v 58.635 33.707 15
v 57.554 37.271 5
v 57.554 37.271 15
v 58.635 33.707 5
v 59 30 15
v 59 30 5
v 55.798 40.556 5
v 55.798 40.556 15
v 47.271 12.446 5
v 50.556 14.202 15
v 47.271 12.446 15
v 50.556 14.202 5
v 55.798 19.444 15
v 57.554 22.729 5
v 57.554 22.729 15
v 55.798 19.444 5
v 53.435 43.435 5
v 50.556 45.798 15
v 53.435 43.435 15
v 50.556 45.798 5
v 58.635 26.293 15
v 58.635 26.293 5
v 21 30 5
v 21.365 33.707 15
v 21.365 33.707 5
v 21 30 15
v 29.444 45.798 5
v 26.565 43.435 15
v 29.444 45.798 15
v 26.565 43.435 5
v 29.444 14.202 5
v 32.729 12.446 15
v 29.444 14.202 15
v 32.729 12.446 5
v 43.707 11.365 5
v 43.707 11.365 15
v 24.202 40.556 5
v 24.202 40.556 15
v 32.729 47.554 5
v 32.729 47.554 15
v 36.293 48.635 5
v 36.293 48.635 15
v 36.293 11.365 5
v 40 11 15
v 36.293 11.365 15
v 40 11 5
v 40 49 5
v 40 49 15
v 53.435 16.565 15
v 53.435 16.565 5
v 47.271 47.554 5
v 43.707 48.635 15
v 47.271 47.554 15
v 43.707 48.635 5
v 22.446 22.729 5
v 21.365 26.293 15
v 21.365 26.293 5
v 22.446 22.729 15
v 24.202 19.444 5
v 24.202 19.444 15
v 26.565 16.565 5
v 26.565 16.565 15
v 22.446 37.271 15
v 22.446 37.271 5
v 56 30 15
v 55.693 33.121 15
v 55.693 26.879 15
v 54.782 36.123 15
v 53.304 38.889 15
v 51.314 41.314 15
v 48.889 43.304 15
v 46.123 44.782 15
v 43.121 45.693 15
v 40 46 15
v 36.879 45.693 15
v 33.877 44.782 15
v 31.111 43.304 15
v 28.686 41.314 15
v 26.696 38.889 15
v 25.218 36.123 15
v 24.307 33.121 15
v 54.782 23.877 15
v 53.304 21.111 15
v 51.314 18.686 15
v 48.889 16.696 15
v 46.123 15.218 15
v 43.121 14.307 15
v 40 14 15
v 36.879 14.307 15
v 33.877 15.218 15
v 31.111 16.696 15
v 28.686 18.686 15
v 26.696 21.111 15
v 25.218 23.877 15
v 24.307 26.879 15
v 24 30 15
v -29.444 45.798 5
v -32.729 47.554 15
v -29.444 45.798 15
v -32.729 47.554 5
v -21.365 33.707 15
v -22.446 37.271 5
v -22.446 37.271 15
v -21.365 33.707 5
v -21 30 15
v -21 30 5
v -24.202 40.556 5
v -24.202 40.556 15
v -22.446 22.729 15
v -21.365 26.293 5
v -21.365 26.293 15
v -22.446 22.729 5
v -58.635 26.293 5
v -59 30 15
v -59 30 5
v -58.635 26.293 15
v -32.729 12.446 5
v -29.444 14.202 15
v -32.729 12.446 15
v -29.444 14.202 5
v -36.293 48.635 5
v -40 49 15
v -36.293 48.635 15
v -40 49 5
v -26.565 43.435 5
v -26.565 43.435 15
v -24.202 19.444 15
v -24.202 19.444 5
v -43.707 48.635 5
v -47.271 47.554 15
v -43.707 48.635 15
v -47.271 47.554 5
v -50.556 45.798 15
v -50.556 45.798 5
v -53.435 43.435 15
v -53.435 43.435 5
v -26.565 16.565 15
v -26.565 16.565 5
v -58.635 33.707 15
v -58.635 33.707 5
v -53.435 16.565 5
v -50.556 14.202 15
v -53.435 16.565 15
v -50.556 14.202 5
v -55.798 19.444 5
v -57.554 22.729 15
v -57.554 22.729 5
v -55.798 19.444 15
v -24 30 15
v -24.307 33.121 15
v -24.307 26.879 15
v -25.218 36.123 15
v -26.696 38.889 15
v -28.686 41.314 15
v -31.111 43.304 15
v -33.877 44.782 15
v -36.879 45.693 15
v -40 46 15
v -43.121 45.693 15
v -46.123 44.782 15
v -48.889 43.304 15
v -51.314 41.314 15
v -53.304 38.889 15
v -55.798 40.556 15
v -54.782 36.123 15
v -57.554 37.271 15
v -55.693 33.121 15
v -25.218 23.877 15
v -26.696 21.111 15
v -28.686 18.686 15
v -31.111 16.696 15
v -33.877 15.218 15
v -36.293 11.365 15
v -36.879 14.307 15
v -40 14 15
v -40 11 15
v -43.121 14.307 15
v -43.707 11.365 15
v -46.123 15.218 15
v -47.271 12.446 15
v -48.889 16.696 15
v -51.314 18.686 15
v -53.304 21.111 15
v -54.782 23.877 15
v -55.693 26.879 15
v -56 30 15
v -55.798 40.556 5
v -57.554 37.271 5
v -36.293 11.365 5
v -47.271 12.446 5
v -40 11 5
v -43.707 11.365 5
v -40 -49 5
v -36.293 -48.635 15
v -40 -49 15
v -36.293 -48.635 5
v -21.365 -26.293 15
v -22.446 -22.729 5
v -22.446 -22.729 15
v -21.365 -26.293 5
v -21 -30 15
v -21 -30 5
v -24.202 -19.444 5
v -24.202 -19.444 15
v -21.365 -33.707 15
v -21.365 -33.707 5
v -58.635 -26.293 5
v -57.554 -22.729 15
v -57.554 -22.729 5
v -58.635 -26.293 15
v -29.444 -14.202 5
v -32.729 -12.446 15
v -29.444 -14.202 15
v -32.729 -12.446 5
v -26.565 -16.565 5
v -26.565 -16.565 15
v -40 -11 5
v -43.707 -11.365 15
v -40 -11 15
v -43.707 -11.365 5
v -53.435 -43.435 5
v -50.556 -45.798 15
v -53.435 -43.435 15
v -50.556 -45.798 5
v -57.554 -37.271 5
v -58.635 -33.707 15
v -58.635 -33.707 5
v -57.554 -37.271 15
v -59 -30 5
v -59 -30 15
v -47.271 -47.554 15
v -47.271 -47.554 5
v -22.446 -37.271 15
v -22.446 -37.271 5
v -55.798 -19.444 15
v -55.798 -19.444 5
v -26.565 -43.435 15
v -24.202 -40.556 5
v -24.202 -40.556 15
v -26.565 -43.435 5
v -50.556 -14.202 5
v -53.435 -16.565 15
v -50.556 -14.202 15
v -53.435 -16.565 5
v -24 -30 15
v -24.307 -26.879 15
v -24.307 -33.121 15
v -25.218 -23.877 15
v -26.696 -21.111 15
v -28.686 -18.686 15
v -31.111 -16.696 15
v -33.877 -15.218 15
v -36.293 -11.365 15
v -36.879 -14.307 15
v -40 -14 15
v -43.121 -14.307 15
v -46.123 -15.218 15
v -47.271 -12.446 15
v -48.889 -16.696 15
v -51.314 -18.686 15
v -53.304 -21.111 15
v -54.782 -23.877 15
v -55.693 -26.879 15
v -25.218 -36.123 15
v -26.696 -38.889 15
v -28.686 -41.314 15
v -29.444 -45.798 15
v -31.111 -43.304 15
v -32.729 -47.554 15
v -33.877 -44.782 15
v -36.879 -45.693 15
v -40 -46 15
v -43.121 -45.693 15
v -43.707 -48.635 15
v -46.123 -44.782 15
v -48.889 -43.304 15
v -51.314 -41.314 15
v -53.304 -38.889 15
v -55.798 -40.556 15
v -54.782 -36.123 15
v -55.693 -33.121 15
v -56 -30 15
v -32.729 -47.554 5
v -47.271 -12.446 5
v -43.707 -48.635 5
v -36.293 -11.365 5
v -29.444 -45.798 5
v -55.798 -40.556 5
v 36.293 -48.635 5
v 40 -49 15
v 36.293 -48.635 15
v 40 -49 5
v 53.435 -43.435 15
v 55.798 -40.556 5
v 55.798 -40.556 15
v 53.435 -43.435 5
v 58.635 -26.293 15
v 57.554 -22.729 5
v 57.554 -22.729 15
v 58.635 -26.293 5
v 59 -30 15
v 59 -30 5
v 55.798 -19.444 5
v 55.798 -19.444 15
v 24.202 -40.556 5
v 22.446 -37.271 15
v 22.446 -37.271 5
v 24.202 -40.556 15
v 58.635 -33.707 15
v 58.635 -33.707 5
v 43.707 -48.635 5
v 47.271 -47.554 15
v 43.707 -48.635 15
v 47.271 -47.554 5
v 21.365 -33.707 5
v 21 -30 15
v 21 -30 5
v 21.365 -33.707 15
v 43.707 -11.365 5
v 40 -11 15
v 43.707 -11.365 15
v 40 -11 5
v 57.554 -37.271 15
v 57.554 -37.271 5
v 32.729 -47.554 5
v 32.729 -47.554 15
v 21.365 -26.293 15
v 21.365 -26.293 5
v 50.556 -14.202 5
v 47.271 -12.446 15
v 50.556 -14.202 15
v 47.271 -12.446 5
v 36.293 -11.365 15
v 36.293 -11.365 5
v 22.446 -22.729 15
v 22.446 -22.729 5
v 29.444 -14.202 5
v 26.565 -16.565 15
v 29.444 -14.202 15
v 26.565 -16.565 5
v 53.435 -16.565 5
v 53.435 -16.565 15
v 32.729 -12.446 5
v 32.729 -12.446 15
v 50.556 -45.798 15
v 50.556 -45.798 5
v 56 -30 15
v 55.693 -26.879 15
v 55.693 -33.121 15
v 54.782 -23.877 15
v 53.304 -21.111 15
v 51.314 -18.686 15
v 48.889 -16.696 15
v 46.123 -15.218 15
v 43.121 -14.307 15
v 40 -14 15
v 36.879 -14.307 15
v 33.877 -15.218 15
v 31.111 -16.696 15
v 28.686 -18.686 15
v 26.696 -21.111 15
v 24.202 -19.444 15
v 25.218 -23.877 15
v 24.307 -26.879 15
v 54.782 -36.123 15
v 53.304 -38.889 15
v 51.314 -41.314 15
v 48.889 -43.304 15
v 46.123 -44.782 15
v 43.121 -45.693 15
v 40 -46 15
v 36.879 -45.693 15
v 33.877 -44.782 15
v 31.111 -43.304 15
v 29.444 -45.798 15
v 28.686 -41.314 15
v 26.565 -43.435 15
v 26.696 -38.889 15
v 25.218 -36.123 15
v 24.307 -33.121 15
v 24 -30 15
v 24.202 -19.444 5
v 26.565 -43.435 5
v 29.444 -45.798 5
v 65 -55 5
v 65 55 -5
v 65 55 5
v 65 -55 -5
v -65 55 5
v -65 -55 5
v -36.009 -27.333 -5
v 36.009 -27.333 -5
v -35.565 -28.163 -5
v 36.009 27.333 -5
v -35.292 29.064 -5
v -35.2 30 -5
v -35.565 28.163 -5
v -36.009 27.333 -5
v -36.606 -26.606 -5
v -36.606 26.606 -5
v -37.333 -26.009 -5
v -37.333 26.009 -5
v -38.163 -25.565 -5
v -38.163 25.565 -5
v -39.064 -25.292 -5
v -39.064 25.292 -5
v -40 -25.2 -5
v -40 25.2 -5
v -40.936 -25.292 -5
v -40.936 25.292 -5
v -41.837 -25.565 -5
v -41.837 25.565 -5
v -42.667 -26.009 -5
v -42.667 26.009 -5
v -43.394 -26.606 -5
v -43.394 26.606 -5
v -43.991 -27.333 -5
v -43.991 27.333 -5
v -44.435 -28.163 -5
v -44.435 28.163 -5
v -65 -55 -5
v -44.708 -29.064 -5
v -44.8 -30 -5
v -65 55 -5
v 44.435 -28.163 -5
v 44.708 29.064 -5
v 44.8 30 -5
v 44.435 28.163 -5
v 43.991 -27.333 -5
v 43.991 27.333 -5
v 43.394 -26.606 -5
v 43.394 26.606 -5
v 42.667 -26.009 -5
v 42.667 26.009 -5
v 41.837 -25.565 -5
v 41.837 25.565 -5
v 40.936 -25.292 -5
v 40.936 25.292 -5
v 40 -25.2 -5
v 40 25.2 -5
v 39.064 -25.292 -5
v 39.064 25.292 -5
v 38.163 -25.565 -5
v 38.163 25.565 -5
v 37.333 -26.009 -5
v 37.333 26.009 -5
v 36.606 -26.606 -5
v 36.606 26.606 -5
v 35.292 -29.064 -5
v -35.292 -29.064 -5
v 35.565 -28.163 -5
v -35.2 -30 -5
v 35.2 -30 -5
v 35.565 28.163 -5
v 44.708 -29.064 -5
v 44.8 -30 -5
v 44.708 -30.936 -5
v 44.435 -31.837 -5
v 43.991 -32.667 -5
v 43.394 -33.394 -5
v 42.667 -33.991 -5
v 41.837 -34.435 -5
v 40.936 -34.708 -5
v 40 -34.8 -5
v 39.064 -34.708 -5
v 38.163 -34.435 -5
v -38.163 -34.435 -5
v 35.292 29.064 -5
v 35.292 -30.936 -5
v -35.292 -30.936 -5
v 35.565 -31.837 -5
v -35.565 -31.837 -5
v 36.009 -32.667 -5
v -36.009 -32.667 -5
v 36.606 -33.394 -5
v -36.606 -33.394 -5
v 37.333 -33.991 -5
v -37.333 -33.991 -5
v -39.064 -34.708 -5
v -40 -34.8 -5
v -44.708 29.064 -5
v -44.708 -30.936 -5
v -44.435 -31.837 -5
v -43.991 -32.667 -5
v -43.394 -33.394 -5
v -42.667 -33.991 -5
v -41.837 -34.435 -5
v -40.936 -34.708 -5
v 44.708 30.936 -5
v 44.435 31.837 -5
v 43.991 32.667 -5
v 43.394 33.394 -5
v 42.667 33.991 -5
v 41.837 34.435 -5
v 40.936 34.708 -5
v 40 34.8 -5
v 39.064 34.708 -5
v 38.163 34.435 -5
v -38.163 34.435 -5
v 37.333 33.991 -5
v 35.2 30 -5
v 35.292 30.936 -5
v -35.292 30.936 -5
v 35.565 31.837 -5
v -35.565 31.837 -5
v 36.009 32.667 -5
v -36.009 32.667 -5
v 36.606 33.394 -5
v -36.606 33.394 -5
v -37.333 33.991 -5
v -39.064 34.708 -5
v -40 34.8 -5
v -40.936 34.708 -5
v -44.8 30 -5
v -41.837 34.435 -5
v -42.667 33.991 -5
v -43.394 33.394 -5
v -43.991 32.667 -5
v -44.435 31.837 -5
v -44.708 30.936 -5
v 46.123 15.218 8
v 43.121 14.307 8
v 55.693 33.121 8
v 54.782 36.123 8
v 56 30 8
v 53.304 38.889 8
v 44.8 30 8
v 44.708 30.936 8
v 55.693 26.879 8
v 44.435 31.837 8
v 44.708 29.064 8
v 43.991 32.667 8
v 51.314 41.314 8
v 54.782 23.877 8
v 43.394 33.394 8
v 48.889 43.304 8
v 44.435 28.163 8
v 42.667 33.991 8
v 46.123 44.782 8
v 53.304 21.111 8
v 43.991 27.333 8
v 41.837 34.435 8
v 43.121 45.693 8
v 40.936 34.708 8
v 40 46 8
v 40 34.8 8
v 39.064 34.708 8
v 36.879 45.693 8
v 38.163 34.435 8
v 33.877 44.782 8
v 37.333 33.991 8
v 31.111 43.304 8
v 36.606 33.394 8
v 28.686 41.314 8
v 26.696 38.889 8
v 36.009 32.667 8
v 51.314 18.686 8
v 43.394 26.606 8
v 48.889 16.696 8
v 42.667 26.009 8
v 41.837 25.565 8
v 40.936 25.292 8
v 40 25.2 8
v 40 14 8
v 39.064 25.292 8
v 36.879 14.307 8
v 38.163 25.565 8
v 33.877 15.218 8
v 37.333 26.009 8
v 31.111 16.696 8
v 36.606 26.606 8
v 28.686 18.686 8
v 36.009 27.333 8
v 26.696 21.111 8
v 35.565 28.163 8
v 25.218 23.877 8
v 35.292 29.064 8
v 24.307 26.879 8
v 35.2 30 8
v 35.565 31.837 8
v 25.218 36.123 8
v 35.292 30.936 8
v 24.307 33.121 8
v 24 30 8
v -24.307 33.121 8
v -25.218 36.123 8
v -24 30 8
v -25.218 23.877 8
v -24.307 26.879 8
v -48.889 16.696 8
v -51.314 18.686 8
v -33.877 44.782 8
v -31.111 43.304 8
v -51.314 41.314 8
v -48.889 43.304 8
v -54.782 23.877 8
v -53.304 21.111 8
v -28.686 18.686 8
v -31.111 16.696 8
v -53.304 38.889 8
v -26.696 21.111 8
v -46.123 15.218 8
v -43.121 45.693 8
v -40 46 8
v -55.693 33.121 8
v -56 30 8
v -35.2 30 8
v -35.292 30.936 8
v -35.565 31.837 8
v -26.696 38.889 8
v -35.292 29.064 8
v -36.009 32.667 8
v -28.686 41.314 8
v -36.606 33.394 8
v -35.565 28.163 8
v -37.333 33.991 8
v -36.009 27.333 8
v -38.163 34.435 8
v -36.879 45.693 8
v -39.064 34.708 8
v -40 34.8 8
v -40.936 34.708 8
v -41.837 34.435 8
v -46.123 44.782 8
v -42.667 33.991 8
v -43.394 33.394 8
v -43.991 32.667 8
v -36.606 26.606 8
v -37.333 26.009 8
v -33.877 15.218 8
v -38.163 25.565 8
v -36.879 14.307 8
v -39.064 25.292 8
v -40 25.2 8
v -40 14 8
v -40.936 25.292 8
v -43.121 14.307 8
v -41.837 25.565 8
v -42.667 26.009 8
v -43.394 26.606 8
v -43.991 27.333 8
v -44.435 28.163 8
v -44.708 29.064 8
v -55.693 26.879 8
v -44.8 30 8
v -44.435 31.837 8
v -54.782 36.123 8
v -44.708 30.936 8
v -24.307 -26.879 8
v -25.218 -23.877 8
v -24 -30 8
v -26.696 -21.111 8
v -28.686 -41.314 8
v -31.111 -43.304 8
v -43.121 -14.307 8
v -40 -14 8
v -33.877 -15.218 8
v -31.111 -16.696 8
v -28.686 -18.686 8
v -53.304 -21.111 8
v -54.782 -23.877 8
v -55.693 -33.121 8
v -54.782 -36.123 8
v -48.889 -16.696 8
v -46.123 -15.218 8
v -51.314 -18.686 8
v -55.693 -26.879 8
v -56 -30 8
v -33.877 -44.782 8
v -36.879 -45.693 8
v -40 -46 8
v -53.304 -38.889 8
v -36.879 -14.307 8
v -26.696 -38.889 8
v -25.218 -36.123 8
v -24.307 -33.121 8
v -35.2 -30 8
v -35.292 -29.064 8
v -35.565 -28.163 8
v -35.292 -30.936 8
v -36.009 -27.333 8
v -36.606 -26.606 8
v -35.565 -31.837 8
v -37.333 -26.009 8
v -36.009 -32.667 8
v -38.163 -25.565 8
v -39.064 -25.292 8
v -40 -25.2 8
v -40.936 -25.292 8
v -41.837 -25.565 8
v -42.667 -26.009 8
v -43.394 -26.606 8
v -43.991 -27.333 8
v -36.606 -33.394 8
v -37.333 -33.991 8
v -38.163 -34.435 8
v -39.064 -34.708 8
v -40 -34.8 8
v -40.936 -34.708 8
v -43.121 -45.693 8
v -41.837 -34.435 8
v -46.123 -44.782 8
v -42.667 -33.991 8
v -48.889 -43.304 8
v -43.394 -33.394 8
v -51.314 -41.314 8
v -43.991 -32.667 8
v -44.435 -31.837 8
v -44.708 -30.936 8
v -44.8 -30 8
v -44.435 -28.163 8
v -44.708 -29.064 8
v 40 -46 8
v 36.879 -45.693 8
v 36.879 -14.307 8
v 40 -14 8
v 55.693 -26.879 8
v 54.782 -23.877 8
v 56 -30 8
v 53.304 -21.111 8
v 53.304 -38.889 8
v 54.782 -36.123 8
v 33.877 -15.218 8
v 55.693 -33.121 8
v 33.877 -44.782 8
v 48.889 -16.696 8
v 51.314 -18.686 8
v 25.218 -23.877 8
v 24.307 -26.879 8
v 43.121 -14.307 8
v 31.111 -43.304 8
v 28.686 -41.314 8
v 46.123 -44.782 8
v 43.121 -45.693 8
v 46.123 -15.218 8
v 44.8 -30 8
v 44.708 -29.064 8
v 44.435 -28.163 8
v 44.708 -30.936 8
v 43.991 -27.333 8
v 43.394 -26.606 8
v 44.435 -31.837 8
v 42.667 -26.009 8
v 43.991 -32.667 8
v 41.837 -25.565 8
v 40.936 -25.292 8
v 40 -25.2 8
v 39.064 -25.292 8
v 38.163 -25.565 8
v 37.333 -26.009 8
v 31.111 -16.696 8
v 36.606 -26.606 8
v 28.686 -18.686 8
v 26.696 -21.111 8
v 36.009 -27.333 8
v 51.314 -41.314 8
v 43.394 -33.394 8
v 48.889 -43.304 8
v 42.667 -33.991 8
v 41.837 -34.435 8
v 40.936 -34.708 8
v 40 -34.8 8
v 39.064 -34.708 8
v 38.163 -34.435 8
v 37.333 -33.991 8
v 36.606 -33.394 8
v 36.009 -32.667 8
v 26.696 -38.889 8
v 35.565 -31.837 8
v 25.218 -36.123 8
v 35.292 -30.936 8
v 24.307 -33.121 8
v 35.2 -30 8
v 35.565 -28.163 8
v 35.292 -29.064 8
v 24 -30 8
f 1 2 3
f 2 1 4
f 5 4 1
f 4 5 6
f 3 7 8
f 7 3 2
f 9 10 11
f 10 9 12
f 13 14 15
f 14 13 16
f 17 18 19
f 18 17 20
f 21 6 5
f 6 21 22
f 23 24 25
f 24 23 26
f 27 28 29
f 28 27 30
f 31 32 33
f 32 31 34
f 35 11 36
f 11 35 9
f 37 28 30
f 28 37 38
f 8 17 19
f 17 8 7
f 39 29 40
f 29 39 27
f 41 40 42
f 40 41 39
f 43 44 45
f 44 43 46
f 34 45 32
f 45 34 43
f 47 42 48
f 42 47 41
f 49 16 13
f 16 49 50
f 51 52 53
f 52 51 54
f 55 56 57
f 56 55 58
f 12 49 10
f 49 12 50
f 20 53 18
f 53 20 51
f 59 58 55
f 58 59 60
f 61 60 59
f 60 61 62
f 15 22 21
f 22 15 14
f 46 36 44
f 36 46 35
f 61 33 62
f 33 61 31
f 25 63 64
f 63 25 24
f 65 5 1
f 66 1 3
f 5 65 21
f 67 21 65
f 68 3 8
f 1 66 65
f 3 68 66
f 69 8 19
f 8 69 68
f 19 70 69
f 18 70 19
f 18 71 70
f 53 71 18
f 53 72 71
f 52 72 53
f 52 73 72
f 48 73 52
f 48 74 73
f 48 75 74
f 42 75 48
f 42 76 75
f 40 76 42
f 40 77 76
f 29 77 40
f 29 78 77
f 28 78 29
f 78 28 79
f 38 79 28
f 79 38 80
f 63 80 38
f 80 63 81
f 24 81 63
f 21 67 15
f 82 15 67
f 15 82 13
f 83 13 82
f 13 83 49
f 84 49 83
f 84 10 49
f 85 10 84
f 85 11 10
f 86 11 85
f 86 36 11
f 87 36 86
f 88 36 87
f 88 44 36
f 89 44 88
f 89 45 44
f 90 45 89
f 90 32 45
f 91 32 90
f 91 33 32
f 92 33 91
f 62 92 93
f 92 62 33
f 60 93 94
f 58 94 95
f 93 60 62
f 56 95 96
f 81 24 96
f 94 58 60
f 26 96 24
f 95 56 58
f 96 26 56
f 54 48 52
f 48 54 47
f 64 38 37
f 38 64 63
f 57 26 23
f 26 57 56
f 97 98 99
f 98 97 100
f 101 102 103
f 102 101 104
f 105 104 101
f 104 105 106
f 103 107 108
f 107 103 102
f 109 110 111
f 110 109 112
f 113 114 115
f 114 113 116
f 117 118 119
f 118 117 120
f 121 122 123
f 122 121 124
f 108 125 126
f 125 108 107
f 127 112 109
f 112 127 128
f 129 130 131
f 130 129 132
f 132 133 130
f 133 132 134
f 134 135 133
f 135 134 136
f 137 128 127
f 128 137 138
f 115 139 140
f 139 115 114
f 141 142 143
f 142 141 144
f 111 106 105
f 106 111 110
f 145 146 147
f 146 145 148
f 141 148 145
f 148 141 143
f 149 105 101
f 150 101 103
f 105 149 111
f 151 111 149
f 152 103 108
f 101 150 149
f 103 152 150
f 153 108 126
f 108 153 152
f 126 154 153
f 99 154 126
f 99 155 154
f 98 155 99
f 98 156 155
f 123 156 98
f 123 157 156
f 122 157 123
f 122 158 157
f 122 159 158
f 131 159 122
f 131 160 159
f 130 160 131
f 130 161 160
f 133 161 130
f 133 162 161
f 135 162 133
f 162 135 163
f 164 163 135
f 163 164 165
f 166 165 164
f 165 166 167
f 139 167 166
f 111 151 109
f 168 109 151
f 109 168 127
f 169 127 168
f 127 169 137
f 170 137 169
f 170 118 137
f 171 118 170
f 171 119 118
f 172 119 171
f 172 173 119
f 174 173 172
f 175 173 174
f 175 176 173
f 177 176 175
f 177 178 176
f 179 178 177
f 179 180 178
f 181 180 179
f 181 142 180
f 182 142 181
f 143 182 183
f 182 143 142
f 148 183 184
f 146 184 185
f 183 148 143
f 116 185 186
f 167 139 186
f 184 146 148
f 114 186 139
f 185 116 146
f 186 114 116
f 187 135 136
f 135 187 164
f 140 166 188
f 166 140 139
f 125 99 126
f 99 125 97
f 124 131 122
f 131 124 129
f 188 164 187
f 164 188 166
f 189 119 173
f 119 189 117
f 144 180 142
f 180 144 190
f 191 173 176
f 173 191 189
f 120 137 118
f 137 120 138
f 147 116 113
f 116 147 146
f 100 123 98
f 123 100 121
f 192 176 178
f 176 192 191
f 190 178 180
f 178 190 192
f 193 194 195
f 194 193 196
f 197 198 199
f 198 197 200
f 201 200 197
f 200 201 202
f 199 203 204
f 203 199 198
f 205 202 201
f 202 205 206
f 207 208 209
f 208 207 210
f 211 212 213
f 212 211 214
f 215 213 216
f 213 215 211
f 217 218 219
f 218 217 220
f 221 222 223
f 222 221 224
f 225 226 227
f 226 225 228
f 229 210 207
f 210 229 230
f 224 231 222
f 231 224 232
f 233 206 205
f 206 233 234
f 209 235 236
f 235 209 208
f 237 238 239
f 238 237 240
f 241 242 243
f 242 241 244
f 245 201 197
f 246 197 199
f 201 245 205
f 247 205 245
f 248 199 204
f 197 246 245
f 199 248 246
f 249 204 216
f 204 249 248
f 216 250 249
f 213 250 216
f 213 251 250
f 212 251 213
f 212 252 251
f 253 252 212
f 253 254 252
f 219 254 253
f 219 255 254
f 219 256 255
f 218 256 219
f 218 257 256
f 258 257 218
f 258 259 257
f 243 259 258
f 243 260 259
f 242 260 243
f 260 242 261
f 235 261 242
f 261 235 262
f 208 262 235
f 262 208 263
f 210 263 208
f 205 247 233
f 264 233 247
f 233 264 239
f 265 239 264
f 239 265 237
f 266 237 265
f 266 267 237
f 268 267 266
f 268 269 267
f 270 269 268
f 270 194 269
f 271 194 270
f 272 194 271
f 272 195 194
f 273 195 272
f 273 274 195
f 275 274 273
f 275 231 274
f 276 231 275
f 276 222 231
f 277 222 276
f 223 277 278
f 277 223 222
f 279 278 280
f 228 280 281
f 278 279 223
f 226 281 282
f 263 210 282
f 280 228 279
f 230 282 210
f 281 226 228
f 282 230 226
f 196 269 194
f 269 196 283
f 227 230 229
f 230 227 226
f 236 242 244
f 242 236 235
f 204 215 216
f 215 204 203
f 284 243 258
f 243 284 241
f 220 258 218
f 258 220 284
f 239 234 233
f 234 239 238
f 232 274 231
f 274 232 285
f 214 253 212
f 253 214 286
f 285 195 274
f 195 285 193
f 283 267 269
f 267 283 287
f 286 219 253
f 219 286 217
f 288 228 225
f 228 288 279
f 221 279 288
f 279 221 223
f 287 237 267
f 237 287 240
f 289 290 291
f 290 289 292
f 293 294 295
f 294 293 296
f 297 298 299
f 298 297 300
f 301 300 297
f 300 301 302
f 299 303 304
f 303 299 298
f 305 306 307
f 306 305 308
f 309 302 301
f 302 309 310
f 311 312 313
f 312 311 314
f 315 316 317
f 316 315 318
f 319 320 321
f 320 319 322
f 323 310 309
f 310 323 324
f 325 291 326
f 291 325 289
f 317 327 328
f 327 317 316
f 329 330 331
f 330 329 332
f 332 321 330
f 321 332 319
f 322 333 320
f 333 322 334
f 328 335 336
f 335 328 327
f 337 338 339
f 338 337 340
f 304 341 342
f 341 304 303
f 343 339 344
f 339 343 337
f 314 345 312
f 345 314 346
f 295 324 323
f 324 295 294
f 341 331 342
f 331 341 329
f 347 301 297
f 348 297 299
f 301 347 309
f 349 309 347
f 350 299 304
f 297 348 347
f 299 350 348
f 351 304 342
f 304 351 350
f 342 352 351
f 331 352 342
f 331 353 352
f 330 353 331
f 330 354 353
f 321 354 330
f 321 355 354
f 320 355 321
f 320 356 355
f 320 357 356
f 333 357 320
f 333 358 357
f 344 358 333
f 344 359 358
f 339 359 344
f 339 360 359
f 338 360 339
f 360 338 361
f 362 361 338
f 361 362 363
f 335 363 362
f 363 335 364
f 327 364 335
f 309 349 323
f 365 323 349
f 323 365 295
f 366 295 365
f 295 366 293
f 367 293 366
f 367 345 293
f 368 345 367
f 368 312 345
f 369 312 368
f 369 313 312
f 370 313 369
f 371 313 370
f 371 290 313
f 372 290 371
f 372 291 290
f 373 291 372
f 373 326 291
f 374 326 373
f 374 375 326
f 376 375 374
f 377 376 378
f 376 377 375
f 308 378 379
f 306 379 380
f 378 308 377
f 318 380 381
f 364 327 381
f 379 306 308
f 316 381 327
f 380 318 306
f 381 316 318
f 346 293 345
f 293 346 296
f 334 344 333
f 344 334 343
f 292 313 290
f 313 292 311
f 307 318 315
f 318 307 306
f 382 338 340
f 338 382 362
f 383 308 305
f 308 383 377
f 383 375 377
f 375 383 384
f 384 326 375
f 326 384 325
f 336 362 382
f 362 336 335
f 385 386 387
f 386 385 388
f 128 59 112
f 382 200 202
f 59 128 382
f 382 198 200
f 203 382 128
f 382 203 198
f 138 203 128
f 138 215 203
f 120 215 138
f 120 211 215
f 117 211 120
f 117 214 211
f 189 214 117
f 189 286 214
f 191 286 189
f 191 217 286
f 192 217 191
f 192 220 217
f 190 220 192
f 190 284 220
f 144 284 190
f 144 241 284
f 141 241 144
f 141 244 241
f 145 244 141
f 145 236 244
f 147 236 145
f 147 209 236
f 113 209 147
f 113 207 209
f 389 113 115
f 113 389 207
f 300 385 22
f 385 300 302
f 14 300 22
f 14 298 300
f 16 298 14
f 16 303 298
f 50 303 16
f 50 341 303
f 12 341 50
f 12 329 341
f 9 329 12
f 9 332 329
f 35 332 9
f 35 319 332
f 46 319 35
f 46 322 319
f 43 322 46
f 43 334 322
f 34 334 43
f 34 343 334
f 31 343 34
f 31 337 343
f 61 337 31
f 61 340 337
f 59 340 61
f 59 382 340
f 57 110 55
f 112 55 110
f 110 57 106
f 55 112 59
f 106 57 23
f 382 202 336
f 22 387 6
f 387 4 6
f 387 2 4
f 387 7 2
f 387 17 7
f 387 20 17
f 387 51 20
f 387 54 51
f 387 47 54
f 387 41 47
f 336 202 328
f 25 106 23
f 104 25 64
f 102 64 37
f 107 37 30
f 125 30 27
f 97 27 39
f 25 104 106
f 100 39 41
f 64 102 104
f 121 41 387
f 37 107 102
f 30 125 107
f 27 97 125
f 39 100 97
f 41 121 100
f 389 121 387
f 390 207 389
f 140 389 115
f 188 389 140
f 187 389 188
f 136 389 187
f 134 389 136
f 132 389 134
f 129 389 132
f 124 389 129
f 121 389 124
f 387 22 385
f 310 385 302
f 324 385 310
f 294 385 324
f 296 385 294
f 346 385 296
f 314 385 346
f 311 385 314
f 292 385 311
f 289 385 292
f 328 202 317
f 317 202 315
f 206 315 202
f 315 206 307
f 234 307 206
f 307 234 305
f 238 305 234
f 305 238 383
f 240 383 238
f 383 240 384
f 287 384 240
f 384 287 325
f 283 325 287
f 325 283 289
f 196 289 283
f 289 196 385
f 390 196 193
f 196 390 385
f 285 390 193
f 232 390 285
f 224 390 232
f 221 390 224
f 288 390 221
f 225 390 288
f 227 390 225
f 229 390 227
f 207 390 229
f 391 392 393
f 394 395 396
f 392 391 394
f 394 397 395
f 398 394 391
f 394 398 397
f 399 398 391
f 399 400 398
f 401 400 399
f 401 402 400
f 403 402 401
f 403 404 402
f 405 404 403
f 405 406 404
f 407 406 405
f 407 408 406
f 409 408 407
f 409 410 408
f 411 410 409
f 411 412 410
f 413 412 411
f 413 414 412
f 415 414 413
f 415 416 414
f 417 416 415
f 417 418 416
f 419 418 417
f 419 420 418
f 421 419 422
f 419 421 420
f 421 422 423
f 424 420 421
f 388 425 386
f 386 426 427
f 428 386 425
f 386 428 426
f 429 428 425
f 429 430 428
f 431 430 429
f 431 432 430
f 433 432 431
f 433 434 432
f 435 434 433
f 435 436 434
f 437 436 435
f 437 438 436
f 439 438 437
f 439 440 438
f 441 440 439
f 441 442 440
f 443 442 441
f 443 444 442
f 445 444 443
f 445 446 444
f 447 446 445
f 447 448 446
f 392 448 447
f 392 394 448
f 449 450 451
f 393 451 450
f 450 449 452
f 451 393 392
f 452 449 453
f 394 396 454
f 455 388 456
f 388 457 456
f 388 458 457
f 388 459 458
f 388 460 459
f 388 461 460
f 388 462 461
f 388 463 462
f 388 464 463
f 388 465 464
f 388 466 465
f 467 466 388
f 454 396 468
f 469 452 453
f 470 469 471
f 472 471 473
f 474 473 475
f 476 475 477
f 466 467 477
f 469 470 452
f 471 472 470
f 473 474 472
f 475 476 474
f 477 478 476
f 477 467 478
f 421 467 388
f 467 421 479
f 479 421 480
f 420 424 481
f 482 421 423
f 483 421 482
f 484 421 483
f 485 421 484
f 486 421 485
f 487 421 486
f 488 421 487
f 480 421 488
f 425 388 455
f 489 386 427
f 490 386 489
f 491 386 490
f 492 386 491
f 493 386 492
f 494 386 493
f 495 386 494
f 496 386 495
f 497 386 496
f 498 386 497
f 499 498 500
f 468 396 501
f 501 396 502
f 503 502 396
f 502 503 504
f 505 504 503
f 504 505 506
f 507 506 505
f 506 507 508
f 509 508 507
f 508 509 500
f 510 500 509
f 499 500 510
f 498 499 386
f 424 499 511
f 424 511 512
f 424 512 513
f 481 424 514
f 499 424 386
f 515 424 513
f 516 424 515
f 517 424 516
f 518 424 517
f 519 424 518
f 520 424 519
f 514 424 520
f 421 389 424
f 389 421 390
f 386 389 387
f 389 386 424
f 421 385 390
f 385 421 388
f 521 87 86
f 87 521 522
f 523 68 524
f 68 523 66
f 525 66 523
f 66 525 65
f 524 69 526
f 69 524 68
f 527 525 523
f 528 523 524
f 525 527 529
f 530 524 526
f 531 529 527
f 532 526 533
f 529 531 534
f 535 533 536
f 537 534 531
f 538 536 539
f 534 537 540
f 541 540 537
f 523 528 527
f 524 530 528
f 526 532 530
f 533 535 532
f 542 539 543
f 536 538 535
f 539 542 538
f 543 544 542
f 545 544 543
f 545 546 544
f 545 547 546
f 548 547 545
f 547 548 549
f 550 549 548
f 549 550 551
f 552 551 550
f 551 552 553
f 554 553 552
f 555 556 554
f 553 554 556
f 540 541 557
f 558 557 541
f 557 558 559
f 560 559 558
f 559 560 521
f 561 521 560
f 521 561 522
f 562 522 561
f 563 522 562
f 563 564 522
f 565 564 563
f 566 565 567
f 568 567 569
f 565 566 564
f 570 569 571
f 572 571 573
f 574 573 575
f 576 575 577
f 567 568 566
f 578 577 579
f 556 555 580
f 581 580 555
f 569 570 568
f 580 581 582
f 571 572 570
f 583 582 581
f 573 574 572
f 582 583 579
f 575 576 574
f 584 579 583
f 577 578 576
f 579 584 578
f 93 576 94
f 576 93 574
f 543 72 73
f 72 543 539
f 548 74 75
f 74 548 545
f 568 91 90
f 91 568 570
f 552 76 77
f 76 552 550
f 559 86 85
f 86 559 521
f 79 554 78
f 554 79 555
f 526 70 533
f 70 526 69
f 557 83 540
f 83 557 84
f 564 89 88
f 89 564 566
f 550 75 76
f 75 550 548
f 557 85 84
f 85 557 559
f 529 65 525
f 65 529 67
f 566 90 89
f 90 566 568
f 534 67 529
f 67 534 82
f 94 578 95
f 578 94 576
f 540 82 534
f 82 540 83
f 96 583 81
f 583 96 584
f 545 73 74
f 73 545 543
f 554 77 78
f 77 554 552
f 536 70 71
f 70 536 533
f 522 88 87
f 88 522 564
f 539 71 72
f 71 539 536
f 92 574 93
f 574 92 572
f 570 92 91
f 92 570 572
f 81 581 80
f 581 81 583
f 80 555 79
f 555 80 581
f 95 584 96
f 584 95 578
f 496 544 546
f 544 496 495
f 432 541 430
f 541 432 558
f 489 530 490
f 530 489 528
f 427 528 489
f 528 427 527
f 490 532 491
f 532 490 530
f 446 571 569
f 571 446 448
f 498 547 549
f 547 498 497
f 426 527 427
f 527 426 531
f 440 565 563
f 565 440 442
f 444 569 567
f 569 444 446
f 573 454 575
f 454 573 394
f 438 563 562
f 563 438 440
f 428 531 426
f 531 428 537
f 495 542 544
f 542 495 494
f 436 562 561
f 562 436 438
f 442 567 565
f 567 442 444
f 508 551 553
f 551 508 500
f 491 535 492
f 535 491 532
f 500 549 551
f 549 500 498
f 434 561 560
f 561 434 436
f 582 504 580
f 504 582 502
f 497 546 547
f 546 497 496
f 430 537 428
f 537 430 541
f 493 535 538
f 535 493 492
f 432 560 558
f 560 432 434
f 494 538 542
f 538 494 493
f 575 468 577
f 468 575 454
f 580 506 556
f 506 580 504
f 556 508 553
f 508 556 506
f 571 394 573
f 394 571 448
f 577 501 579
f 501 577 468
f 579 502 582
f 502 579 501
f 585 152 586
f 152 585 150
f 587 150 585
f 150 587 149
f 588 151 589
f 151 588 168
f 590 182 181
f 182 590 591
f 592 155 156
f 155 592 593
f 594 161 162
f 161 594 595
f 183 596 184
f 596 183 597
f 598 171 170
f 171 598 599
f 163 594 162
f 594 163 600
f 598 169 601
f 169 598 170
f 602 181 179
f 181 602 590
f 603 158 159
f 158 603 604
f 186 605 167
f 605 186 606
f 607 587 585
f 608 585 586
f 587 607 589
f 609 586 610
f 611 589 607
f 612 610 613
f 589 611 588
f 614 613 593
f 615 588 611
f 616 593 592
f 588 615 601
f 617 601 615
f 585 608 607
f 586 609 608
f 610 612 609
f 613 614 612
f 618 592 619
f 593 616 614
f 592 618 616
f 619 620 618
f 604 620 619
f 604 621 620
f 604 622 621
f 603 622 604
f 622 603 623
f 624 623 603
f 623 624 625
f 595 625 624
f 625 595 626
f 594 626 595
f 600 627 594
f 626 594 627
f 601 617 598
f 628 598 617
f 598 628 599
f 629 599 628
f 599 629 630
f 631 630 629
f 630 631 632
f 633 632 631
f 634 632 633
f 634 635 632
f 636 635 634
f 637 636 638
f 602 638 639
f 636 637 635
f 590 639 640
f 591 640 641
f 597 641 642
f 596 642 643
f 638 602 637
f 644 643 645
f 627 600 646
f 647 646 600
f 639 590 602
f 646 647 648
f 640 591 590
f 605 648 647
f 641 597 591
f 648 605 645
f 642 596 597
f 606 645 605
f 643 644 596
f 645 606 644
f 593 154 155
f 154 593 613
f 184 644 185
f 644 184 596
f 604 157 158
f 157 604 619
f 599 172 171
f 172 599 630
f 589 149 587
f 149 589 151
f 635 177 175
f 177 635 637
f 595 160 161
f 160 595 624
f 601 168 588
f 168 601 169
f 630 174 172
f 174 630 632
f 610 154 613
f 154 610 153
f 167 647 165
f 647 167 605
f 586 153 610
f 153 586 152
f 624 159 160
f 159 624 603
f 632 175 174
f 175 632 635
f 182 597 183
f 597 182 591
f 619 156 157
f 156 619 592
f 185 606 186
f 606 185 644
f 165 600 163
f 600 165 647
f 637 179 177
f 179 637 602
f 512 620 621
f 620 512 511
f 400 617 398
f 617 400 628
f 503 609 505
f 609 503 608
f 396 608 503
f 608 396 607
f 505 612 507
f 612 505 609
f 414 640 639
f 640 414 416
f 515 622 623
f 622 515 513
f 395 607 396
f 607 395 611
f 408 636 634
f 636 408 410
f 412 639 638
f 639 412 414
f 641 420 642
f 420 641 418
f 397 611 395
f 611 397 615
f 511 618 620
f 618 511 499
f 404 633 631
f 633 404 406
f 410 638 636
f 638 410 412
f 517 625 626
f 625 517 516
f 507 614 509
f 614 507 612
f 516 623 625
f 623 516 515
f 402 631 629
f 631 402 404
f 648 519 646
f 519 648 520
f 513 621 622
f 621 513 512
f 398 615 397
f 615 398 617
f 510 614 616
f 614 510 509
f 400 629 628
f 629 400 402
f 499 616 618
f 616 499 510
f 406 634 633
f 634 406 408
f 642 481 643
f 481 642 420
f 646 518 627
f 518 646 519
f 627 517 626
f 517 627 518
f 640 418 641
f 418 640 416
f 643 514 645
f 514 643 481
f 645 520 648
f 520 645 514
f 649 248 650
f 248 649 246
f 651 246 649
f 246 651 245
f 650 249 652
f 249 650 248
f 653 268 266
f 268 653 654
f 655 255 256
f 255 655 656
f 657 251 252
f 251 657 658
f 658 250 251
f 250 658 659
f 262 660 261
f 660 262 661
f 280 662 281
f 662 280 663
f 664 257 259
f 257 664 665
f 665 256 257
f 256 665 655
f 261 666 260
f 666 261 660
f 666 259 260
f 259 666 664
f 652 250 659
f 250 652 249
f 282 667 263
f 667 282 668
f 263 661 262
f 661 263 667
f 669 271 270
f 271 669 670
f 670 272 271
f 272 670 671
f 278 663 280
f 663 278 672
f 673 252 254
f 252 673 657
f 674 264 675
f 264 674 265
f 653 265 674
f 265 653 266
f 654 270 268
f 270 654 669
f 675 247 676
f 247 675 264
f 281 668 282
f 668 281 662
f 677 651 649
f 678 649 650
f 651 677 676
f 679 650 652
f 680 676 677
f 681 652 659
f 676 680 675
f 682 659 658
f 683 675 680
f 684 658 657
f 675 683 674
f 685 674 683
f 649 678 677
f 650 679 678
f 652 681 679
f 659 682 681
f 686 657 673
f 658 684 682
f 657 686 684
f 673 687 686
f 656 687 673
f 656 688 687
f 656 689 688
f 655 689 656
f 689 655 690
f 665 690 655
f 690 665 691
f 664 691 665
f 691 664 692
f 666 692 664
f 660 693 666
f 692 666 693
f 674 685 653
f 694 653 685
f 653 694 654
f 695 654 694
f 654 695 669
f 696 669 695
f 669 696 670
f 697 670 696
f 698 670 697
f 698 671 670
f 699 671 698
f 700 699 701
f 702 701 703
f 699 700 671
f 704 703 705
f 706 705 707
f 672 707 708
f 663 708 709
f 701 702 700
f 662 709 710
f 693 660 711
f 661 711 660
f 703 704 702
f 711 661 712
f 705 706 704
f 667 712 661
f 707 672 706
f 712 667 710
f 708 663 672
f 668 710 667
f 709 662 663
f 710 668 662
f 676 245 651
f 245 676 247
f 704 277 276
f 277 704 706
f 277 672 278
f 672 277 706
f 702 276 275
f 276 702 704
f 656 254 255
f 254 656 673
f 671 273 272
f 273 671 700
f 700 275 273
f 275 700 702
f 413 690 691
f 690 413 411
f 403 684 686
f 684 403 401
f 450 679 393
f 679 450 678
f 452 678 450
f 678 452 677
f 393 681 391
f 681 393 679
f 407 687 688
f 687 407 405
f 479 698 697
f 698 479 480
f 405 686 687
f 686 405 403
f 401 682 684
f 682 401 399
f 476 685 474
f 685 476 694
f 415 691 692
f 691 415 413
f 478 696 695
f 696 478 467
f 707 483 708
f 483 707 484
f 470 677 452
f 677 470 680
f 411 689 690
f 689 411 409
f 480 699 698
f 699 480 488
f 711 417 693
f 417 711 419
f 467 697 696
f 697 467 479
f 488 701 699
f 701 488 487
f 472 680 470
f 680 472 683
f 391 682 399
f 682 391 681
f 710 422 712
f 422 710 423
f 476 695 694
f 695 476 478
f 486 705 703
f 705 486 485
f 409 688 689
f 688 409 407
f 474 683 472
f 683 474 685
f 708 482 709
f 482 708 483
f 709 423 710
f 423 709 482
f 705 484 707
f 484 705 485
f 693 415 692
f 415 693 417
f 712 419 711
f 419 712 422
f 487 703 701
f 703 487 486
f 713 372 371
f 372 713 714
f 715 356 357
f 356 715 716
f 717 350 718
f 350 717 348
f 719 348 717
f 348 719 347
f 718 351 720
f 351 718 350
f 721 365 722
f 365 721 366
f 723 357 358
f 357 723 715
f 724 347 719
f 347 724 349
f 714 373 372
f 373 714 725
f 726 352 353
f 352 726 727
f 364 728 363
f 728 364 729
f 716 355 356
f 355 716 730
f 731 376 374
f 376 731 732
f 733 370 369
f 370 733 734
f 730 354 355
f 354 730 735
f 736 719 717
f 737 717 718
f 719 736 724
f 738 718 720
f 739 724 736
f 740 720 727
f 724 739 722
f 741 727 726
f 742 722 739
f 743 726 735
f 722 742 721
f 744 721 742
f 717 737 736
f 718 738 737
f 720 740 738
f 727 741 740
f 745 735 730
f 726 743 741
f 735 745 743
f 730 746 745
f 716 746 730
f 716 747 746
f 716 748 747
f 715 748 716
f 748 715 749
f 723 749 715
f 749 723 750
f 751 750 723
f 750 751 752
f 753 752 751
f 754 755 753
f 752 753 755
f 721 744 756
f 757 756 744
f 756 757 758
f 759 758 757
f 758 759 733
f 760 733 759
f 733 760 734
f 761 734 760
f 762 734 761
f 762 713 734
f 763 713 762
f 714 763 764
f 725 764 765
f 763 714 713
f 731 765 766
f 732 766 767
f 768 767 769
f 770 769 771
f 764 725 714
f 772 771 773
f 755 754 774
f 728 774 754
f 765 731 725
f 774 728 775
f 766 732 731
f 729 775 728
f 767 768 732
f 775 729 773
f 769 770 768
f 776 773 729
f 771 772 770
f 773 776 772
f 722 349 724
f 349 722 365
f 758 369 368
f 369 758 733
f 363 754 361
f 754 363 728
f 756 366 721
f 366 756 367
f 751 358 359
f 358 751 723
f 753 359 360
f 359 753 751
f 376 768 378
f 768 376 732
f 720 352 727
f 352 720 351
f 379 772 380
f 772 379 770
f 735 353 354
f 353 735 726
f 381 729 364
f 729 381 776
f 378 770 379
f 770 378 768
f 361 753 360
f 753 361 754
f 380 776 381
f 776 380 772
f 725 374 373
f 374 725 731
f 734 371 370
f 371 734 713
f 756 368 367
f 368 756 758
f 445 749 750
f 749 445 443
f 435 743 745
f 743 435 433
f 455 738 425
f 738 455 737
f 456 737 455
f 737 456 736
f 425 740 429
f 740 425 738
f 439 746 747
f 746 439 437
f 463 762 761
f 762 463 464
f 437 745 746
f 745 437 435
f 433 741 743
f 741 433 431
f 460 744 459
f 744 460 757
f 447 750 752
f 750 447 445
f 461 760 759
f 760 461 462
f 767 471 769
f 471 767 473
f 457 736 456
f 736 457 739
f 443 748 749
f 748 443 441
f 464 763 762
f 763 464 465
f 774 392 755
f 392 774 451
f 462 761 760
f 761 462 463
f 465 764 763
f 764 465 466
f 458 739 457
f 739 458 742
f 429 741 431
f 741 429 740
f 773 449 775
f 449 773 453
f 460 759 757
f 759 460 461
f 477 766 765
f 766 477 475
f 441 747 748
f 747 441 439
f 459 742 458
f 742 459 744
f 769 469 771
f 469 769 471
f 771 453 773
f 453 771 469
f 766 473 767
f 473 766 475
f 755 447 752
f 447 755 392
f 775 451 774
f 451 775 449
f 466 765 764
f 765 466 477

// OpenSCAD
$fn = 32;

// ----------------------------------------------------------------------
// Socket pad plate
// bosses with counterbored sockets for the screws
// ----------------------------------------------------------------------

// --- parameters (mm) ---
base_t = 10;             // base plate thickness
boss_h = 10;             // boss height above the base plate
boss_d = 38;             // boss diameter
socket_d = 32;           // socket diameter
socket_depth = 7;        // socket depth from the boss face
bolt_d = 9.6;            // screw clearance hole through the socket floor
plate = [130, 110, 10];  // overall size (x, y, z)
edge = 25;               // boss centre offset from the plate edge
pads = 4;                // boss count, one per corner

// --- derived feature positions (mm) ---
height = base_t + boss_h;        // = 20   overall height of the part
corner_x = plate[0] / 2 - edge;  // = 40   boss centre X
corner_y = plate[1] / 2 - edge;  // = 30   boss centre Y
feature_centers = [
  [corner_x, corner_y],
  [-corner_x, corner_y],
  [-corner_x, -corner_y],
  [corner_x, -corner_y]
];   // boss centres: sockets, holes and the pads themselves are placed from here

// base plate, bosses on feature_centers, socket + through hole in each
difference() {
  union() {
    cube(plate, center = true);
    for (centre = feature_centers)
      translate([centre[0], centre[1], plate[2] / 2 - 1])
        cylinder(d = boss_d, h = boss_h + 1);
  }
  for (centre = feature_centers) {
    translate([centre[0], centre[1], plate[2] / 2 + boss_h - socket_depth])
      cylinder(d = socket_d, h = socket_depth + 1);
    translate([centre[0], centre[1], -height])
      cylinder(d = bolt_d, h = 2 * height + 2);  // through the socket floor
  }
}
